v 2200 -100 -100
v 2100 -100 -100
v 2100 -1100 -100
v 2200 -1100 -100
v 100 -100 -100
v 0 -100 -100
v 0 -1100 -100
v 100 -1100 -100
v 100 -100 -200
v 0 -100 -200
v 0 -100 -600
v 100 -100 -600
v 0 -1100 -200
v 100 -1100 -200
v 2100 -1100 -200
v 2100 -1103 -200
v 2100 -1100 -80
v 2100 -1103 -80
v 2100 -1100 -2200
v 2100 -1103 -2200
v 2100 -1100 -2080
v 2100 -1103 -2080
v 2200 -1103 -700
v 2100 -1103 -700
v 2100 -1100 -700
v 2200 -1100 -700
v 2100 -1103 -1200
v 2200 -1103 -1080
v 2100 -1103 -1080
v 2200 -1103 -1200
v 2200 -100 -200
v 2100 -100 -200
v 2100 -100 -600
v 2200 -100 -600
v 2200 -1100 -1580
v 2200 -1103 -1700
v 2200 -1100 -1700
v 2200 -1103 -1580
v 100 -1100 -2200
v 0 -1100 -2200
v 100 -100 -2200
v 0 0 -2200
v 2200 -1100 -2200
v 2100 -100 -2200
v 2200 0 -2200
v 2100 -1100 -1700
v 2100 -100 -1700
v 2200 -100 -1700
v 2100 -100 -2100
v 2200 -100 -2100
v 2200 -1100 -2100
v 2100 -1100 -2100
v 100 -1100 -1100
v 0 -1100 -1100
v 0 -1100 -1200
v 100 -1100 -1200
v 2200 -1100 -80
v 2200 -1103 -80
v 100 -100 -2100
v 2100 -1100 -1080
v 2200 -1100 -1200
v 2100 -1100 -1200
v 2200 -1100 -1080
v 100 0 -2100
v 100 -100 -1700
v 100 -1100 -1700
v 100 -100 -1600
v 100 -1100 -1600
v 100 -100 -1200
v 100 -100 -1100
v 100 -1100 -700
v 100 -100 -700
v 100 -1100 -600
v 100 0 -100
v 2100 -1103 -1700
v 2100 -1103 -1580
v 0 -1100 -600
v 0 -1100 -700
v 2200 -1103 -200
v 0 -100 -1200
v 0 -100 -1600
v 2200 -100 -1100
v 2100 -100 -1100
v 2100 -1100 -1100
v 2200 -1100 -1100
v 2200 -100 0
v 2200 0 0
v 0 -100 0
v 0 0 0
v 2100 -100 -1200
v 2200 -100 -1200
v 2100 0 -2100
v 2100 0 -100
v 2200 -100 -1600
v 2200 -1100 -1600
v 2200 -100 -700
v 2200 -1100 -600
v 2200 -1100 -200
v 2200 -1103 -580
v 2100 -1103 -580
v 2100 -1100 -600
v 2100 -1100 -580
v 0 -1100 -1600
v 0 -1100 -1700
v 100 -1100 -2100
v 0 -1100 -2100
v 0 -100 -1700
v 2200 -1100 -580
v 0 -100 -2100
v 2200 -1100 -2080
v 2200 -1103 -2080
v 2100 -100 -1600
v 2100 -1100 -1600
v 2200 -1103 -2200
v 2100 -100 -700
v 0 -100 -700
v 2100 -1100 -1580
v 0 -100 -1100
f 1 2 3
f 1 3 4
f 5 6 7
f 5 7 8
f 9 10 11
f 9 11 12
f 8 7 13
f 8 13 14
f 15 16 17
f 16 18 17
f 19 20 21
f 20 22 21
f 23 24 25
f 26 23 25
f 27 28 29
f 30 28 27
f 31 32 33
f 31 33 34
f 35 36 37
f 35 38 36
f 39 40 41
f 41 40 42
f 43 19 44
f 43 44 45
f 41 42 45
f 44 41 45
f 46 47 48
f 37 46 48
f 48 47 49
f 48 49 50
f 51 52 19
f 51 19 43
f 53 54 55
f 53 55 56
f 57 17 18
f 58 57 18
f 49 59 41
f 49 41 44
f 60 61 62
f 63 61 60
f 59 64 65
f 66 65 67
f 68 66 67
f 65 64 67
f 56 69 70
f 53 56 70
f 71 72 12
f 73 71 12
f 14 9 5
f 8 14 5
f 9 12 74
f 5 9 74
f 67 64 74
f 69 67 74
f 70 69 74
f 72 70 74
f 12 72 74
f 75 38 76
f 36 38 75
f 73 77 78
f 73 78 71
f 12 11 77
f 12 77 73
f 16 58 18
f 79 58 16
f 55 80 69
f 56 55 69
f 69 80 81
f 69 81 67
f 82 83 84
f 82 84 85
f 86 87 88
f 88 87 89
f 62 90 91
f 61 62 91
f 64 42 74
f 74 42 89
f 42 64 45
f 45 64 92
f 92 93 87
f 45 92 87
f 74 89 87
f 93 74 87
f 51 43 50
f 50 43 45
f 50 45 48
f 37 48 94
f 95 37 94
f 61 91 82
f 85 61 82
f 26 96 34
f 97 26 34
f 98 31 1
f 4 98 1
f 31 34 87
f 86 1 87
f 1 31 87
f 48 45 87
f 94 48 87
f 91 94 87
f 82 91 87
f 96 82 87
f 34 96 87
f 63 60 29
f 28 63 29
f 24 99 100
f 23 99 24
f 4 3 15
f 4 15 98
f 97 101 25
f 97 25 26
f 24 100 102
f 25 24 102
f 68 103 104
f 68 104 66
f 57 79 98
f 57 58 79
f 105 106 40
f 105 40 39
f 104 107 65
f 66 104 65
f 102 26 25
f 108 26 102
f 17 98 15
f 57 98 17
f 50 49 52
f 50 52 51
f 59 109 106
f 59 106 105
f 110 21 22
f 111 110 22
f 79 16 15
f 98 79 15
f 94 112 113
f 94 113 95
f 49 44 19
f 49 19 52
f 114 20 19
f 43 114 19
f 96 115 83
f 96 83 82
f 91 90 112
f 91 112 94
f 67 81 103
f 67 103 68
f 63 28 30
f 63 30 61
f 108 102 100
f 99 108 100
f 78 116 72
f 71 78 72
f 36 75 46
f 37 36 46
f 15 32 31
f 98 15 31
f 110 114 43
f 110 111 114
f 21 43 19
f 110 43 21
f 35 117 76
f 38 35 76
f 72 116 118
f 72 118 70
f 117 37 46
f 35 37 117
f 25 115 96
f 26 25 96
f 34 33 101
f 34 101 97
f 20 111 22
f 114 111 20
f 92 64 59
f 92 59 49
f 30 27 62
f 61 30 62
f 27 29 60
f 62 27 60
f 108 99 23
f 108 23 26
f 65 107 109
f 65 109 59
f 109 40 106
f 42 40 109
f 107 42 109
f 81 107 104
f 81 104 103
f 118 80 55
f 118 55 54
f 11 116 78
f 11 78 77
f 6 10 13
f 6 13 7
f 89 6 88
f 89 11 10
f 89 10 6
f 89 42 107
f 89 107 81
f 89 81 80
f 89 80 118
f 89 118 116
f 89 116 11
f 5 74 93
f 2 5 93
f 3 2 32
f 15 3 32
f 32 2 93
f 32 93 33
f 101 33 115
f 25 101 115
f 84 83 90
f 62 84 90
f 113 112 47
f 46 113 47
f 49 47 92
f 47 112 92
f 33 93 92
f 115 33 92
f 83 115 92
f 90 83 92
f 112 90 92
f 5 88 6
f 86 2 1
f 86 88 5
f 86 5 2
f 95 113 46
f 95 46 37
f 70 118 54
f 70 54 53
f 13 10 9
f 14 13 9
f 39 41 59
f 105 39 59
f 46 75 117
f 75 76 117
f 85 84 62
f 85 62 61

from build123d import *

# Parameters (mm, degrees)
F0_W     = 2000
F0_H     = 100
F1_DEPTH = 100
F2_W     = 100
F2_H     = 100
F3_DEPTH = 1000
F5_DEPTH = 100


# Not quite as in the source:
# - the program builds the solid bodies; features that only make, move or delete a surface that nothing else refers to are left out


with BuildPart() as f1:
    # F0 (on Front) → F1 (new body)
    with BuildSketch(Plane.XZ):
        Polygon((100, 0), (0, 0), (0, -2200), (100, -2200), (100, -2100), (100, -100), align=None)
        with Locations((1100, -2150)):
            Rectangle(F0_W, F0_H)
        Polygon((2200, 0), (2100, 0), (2100, -100), (2100, -2100), (2100, -2200), (2200, -2200), align=None)
        with Locations((1100, -50)):
            Rectangle(F0_W, F0_H)
    extrude(amount=F1_DEPTH)

    # F2 (on face) → F3 (join)
    with BuildSketch(Plane.XZ.offset(100)):
        with Locations((50, -150)):
            Rectangle(F2_W, F2_H)
        with Locations((50, -650)):
            Rectangle(F2_W, F2_H)
        with Locations((50, -1150)):
            Rectangle(F2_W, F2_H)
        with Locations((50, -1650)):
            Rectangle(F2_W, F2_H)
        with Locations((50, -2150)):
            Rectangle(F2_W, F2_H)
        with Locations((2150, -2150)):
            Rectangle(F2_W, F2_H)
        with Locations((2150, -1650)):
            Rectangle(F2_W, F2_H)
        with Locations((2150, -1150)):
            Rectangle(F2_W, F2_H)
        with Locations((2150, -650)):
            Rectangle(F2_W, F2_H)
        with Locations((2150, -150)):
            Rectangle(F2_W, F2_H)
    extrude(amount=F3_DEPTH)


with BuildPart() as f5:
    # F4 (on face) → F5 (new body)
    with BuildSketch(Plane.YZ.offset(2200)):
        Polygon((-1103, -2200), (-1100, -2200), (-1100, -2100), (-1100, -2080), (-1103, -2080), align=None)
    extrude(amount=-F5_DEPTH)


with BuildPart() as f5b:
    # F4 (on face) → F5, piece 2 (new body)
    with BuildSketch(Plane.YZ.offset(2200)):
        Polygon((-1103, -1700), (-1100, -1700), (-1100, -1600), (-1100, -1580), (-1103, -1580), align=None)
    extrude(amount=-F5_DEPTH)


with BuildPart() as f5c:
    # F4 (on face) → F5, piece 3 (new body)
    with BuildSketch(Plane.YZ.offset(2200)):
        Polygon((-1100, -1200), (-1100, -1100), (-1100, -1080), (-1103, -1080), (-1103, -1200), align=None)
    extrude(amount=-F5_DEPTH)


with BuildPart() as f5d:
    # F4 (on face) → F5, piece 4 (new body)
    with BuildSketch(Plane.YZ.offset(2200)):
        Polygon((-1100, -700), (-1100, -600), (-1100, -580), (-1103, -580), (-1103, -700), align=None)
    extrude(amount=-F5_DEPTH)


with BuildPart() as f5e:
    # F4 (on face) → F5, piece 5 (new body)
    with BuildSketch(Plane.YZ.offset(2200)):
        Polygon((-1103, -200), (-1100, -200), (-1100, -100), (-1100, -80), (-1103, -80), align=None)
    extrude(amount=-F5_DEPTH)


solid = Compound([f1.part, f5.part, f5b.part, f5c.part, f5d.part, f5e.part])
